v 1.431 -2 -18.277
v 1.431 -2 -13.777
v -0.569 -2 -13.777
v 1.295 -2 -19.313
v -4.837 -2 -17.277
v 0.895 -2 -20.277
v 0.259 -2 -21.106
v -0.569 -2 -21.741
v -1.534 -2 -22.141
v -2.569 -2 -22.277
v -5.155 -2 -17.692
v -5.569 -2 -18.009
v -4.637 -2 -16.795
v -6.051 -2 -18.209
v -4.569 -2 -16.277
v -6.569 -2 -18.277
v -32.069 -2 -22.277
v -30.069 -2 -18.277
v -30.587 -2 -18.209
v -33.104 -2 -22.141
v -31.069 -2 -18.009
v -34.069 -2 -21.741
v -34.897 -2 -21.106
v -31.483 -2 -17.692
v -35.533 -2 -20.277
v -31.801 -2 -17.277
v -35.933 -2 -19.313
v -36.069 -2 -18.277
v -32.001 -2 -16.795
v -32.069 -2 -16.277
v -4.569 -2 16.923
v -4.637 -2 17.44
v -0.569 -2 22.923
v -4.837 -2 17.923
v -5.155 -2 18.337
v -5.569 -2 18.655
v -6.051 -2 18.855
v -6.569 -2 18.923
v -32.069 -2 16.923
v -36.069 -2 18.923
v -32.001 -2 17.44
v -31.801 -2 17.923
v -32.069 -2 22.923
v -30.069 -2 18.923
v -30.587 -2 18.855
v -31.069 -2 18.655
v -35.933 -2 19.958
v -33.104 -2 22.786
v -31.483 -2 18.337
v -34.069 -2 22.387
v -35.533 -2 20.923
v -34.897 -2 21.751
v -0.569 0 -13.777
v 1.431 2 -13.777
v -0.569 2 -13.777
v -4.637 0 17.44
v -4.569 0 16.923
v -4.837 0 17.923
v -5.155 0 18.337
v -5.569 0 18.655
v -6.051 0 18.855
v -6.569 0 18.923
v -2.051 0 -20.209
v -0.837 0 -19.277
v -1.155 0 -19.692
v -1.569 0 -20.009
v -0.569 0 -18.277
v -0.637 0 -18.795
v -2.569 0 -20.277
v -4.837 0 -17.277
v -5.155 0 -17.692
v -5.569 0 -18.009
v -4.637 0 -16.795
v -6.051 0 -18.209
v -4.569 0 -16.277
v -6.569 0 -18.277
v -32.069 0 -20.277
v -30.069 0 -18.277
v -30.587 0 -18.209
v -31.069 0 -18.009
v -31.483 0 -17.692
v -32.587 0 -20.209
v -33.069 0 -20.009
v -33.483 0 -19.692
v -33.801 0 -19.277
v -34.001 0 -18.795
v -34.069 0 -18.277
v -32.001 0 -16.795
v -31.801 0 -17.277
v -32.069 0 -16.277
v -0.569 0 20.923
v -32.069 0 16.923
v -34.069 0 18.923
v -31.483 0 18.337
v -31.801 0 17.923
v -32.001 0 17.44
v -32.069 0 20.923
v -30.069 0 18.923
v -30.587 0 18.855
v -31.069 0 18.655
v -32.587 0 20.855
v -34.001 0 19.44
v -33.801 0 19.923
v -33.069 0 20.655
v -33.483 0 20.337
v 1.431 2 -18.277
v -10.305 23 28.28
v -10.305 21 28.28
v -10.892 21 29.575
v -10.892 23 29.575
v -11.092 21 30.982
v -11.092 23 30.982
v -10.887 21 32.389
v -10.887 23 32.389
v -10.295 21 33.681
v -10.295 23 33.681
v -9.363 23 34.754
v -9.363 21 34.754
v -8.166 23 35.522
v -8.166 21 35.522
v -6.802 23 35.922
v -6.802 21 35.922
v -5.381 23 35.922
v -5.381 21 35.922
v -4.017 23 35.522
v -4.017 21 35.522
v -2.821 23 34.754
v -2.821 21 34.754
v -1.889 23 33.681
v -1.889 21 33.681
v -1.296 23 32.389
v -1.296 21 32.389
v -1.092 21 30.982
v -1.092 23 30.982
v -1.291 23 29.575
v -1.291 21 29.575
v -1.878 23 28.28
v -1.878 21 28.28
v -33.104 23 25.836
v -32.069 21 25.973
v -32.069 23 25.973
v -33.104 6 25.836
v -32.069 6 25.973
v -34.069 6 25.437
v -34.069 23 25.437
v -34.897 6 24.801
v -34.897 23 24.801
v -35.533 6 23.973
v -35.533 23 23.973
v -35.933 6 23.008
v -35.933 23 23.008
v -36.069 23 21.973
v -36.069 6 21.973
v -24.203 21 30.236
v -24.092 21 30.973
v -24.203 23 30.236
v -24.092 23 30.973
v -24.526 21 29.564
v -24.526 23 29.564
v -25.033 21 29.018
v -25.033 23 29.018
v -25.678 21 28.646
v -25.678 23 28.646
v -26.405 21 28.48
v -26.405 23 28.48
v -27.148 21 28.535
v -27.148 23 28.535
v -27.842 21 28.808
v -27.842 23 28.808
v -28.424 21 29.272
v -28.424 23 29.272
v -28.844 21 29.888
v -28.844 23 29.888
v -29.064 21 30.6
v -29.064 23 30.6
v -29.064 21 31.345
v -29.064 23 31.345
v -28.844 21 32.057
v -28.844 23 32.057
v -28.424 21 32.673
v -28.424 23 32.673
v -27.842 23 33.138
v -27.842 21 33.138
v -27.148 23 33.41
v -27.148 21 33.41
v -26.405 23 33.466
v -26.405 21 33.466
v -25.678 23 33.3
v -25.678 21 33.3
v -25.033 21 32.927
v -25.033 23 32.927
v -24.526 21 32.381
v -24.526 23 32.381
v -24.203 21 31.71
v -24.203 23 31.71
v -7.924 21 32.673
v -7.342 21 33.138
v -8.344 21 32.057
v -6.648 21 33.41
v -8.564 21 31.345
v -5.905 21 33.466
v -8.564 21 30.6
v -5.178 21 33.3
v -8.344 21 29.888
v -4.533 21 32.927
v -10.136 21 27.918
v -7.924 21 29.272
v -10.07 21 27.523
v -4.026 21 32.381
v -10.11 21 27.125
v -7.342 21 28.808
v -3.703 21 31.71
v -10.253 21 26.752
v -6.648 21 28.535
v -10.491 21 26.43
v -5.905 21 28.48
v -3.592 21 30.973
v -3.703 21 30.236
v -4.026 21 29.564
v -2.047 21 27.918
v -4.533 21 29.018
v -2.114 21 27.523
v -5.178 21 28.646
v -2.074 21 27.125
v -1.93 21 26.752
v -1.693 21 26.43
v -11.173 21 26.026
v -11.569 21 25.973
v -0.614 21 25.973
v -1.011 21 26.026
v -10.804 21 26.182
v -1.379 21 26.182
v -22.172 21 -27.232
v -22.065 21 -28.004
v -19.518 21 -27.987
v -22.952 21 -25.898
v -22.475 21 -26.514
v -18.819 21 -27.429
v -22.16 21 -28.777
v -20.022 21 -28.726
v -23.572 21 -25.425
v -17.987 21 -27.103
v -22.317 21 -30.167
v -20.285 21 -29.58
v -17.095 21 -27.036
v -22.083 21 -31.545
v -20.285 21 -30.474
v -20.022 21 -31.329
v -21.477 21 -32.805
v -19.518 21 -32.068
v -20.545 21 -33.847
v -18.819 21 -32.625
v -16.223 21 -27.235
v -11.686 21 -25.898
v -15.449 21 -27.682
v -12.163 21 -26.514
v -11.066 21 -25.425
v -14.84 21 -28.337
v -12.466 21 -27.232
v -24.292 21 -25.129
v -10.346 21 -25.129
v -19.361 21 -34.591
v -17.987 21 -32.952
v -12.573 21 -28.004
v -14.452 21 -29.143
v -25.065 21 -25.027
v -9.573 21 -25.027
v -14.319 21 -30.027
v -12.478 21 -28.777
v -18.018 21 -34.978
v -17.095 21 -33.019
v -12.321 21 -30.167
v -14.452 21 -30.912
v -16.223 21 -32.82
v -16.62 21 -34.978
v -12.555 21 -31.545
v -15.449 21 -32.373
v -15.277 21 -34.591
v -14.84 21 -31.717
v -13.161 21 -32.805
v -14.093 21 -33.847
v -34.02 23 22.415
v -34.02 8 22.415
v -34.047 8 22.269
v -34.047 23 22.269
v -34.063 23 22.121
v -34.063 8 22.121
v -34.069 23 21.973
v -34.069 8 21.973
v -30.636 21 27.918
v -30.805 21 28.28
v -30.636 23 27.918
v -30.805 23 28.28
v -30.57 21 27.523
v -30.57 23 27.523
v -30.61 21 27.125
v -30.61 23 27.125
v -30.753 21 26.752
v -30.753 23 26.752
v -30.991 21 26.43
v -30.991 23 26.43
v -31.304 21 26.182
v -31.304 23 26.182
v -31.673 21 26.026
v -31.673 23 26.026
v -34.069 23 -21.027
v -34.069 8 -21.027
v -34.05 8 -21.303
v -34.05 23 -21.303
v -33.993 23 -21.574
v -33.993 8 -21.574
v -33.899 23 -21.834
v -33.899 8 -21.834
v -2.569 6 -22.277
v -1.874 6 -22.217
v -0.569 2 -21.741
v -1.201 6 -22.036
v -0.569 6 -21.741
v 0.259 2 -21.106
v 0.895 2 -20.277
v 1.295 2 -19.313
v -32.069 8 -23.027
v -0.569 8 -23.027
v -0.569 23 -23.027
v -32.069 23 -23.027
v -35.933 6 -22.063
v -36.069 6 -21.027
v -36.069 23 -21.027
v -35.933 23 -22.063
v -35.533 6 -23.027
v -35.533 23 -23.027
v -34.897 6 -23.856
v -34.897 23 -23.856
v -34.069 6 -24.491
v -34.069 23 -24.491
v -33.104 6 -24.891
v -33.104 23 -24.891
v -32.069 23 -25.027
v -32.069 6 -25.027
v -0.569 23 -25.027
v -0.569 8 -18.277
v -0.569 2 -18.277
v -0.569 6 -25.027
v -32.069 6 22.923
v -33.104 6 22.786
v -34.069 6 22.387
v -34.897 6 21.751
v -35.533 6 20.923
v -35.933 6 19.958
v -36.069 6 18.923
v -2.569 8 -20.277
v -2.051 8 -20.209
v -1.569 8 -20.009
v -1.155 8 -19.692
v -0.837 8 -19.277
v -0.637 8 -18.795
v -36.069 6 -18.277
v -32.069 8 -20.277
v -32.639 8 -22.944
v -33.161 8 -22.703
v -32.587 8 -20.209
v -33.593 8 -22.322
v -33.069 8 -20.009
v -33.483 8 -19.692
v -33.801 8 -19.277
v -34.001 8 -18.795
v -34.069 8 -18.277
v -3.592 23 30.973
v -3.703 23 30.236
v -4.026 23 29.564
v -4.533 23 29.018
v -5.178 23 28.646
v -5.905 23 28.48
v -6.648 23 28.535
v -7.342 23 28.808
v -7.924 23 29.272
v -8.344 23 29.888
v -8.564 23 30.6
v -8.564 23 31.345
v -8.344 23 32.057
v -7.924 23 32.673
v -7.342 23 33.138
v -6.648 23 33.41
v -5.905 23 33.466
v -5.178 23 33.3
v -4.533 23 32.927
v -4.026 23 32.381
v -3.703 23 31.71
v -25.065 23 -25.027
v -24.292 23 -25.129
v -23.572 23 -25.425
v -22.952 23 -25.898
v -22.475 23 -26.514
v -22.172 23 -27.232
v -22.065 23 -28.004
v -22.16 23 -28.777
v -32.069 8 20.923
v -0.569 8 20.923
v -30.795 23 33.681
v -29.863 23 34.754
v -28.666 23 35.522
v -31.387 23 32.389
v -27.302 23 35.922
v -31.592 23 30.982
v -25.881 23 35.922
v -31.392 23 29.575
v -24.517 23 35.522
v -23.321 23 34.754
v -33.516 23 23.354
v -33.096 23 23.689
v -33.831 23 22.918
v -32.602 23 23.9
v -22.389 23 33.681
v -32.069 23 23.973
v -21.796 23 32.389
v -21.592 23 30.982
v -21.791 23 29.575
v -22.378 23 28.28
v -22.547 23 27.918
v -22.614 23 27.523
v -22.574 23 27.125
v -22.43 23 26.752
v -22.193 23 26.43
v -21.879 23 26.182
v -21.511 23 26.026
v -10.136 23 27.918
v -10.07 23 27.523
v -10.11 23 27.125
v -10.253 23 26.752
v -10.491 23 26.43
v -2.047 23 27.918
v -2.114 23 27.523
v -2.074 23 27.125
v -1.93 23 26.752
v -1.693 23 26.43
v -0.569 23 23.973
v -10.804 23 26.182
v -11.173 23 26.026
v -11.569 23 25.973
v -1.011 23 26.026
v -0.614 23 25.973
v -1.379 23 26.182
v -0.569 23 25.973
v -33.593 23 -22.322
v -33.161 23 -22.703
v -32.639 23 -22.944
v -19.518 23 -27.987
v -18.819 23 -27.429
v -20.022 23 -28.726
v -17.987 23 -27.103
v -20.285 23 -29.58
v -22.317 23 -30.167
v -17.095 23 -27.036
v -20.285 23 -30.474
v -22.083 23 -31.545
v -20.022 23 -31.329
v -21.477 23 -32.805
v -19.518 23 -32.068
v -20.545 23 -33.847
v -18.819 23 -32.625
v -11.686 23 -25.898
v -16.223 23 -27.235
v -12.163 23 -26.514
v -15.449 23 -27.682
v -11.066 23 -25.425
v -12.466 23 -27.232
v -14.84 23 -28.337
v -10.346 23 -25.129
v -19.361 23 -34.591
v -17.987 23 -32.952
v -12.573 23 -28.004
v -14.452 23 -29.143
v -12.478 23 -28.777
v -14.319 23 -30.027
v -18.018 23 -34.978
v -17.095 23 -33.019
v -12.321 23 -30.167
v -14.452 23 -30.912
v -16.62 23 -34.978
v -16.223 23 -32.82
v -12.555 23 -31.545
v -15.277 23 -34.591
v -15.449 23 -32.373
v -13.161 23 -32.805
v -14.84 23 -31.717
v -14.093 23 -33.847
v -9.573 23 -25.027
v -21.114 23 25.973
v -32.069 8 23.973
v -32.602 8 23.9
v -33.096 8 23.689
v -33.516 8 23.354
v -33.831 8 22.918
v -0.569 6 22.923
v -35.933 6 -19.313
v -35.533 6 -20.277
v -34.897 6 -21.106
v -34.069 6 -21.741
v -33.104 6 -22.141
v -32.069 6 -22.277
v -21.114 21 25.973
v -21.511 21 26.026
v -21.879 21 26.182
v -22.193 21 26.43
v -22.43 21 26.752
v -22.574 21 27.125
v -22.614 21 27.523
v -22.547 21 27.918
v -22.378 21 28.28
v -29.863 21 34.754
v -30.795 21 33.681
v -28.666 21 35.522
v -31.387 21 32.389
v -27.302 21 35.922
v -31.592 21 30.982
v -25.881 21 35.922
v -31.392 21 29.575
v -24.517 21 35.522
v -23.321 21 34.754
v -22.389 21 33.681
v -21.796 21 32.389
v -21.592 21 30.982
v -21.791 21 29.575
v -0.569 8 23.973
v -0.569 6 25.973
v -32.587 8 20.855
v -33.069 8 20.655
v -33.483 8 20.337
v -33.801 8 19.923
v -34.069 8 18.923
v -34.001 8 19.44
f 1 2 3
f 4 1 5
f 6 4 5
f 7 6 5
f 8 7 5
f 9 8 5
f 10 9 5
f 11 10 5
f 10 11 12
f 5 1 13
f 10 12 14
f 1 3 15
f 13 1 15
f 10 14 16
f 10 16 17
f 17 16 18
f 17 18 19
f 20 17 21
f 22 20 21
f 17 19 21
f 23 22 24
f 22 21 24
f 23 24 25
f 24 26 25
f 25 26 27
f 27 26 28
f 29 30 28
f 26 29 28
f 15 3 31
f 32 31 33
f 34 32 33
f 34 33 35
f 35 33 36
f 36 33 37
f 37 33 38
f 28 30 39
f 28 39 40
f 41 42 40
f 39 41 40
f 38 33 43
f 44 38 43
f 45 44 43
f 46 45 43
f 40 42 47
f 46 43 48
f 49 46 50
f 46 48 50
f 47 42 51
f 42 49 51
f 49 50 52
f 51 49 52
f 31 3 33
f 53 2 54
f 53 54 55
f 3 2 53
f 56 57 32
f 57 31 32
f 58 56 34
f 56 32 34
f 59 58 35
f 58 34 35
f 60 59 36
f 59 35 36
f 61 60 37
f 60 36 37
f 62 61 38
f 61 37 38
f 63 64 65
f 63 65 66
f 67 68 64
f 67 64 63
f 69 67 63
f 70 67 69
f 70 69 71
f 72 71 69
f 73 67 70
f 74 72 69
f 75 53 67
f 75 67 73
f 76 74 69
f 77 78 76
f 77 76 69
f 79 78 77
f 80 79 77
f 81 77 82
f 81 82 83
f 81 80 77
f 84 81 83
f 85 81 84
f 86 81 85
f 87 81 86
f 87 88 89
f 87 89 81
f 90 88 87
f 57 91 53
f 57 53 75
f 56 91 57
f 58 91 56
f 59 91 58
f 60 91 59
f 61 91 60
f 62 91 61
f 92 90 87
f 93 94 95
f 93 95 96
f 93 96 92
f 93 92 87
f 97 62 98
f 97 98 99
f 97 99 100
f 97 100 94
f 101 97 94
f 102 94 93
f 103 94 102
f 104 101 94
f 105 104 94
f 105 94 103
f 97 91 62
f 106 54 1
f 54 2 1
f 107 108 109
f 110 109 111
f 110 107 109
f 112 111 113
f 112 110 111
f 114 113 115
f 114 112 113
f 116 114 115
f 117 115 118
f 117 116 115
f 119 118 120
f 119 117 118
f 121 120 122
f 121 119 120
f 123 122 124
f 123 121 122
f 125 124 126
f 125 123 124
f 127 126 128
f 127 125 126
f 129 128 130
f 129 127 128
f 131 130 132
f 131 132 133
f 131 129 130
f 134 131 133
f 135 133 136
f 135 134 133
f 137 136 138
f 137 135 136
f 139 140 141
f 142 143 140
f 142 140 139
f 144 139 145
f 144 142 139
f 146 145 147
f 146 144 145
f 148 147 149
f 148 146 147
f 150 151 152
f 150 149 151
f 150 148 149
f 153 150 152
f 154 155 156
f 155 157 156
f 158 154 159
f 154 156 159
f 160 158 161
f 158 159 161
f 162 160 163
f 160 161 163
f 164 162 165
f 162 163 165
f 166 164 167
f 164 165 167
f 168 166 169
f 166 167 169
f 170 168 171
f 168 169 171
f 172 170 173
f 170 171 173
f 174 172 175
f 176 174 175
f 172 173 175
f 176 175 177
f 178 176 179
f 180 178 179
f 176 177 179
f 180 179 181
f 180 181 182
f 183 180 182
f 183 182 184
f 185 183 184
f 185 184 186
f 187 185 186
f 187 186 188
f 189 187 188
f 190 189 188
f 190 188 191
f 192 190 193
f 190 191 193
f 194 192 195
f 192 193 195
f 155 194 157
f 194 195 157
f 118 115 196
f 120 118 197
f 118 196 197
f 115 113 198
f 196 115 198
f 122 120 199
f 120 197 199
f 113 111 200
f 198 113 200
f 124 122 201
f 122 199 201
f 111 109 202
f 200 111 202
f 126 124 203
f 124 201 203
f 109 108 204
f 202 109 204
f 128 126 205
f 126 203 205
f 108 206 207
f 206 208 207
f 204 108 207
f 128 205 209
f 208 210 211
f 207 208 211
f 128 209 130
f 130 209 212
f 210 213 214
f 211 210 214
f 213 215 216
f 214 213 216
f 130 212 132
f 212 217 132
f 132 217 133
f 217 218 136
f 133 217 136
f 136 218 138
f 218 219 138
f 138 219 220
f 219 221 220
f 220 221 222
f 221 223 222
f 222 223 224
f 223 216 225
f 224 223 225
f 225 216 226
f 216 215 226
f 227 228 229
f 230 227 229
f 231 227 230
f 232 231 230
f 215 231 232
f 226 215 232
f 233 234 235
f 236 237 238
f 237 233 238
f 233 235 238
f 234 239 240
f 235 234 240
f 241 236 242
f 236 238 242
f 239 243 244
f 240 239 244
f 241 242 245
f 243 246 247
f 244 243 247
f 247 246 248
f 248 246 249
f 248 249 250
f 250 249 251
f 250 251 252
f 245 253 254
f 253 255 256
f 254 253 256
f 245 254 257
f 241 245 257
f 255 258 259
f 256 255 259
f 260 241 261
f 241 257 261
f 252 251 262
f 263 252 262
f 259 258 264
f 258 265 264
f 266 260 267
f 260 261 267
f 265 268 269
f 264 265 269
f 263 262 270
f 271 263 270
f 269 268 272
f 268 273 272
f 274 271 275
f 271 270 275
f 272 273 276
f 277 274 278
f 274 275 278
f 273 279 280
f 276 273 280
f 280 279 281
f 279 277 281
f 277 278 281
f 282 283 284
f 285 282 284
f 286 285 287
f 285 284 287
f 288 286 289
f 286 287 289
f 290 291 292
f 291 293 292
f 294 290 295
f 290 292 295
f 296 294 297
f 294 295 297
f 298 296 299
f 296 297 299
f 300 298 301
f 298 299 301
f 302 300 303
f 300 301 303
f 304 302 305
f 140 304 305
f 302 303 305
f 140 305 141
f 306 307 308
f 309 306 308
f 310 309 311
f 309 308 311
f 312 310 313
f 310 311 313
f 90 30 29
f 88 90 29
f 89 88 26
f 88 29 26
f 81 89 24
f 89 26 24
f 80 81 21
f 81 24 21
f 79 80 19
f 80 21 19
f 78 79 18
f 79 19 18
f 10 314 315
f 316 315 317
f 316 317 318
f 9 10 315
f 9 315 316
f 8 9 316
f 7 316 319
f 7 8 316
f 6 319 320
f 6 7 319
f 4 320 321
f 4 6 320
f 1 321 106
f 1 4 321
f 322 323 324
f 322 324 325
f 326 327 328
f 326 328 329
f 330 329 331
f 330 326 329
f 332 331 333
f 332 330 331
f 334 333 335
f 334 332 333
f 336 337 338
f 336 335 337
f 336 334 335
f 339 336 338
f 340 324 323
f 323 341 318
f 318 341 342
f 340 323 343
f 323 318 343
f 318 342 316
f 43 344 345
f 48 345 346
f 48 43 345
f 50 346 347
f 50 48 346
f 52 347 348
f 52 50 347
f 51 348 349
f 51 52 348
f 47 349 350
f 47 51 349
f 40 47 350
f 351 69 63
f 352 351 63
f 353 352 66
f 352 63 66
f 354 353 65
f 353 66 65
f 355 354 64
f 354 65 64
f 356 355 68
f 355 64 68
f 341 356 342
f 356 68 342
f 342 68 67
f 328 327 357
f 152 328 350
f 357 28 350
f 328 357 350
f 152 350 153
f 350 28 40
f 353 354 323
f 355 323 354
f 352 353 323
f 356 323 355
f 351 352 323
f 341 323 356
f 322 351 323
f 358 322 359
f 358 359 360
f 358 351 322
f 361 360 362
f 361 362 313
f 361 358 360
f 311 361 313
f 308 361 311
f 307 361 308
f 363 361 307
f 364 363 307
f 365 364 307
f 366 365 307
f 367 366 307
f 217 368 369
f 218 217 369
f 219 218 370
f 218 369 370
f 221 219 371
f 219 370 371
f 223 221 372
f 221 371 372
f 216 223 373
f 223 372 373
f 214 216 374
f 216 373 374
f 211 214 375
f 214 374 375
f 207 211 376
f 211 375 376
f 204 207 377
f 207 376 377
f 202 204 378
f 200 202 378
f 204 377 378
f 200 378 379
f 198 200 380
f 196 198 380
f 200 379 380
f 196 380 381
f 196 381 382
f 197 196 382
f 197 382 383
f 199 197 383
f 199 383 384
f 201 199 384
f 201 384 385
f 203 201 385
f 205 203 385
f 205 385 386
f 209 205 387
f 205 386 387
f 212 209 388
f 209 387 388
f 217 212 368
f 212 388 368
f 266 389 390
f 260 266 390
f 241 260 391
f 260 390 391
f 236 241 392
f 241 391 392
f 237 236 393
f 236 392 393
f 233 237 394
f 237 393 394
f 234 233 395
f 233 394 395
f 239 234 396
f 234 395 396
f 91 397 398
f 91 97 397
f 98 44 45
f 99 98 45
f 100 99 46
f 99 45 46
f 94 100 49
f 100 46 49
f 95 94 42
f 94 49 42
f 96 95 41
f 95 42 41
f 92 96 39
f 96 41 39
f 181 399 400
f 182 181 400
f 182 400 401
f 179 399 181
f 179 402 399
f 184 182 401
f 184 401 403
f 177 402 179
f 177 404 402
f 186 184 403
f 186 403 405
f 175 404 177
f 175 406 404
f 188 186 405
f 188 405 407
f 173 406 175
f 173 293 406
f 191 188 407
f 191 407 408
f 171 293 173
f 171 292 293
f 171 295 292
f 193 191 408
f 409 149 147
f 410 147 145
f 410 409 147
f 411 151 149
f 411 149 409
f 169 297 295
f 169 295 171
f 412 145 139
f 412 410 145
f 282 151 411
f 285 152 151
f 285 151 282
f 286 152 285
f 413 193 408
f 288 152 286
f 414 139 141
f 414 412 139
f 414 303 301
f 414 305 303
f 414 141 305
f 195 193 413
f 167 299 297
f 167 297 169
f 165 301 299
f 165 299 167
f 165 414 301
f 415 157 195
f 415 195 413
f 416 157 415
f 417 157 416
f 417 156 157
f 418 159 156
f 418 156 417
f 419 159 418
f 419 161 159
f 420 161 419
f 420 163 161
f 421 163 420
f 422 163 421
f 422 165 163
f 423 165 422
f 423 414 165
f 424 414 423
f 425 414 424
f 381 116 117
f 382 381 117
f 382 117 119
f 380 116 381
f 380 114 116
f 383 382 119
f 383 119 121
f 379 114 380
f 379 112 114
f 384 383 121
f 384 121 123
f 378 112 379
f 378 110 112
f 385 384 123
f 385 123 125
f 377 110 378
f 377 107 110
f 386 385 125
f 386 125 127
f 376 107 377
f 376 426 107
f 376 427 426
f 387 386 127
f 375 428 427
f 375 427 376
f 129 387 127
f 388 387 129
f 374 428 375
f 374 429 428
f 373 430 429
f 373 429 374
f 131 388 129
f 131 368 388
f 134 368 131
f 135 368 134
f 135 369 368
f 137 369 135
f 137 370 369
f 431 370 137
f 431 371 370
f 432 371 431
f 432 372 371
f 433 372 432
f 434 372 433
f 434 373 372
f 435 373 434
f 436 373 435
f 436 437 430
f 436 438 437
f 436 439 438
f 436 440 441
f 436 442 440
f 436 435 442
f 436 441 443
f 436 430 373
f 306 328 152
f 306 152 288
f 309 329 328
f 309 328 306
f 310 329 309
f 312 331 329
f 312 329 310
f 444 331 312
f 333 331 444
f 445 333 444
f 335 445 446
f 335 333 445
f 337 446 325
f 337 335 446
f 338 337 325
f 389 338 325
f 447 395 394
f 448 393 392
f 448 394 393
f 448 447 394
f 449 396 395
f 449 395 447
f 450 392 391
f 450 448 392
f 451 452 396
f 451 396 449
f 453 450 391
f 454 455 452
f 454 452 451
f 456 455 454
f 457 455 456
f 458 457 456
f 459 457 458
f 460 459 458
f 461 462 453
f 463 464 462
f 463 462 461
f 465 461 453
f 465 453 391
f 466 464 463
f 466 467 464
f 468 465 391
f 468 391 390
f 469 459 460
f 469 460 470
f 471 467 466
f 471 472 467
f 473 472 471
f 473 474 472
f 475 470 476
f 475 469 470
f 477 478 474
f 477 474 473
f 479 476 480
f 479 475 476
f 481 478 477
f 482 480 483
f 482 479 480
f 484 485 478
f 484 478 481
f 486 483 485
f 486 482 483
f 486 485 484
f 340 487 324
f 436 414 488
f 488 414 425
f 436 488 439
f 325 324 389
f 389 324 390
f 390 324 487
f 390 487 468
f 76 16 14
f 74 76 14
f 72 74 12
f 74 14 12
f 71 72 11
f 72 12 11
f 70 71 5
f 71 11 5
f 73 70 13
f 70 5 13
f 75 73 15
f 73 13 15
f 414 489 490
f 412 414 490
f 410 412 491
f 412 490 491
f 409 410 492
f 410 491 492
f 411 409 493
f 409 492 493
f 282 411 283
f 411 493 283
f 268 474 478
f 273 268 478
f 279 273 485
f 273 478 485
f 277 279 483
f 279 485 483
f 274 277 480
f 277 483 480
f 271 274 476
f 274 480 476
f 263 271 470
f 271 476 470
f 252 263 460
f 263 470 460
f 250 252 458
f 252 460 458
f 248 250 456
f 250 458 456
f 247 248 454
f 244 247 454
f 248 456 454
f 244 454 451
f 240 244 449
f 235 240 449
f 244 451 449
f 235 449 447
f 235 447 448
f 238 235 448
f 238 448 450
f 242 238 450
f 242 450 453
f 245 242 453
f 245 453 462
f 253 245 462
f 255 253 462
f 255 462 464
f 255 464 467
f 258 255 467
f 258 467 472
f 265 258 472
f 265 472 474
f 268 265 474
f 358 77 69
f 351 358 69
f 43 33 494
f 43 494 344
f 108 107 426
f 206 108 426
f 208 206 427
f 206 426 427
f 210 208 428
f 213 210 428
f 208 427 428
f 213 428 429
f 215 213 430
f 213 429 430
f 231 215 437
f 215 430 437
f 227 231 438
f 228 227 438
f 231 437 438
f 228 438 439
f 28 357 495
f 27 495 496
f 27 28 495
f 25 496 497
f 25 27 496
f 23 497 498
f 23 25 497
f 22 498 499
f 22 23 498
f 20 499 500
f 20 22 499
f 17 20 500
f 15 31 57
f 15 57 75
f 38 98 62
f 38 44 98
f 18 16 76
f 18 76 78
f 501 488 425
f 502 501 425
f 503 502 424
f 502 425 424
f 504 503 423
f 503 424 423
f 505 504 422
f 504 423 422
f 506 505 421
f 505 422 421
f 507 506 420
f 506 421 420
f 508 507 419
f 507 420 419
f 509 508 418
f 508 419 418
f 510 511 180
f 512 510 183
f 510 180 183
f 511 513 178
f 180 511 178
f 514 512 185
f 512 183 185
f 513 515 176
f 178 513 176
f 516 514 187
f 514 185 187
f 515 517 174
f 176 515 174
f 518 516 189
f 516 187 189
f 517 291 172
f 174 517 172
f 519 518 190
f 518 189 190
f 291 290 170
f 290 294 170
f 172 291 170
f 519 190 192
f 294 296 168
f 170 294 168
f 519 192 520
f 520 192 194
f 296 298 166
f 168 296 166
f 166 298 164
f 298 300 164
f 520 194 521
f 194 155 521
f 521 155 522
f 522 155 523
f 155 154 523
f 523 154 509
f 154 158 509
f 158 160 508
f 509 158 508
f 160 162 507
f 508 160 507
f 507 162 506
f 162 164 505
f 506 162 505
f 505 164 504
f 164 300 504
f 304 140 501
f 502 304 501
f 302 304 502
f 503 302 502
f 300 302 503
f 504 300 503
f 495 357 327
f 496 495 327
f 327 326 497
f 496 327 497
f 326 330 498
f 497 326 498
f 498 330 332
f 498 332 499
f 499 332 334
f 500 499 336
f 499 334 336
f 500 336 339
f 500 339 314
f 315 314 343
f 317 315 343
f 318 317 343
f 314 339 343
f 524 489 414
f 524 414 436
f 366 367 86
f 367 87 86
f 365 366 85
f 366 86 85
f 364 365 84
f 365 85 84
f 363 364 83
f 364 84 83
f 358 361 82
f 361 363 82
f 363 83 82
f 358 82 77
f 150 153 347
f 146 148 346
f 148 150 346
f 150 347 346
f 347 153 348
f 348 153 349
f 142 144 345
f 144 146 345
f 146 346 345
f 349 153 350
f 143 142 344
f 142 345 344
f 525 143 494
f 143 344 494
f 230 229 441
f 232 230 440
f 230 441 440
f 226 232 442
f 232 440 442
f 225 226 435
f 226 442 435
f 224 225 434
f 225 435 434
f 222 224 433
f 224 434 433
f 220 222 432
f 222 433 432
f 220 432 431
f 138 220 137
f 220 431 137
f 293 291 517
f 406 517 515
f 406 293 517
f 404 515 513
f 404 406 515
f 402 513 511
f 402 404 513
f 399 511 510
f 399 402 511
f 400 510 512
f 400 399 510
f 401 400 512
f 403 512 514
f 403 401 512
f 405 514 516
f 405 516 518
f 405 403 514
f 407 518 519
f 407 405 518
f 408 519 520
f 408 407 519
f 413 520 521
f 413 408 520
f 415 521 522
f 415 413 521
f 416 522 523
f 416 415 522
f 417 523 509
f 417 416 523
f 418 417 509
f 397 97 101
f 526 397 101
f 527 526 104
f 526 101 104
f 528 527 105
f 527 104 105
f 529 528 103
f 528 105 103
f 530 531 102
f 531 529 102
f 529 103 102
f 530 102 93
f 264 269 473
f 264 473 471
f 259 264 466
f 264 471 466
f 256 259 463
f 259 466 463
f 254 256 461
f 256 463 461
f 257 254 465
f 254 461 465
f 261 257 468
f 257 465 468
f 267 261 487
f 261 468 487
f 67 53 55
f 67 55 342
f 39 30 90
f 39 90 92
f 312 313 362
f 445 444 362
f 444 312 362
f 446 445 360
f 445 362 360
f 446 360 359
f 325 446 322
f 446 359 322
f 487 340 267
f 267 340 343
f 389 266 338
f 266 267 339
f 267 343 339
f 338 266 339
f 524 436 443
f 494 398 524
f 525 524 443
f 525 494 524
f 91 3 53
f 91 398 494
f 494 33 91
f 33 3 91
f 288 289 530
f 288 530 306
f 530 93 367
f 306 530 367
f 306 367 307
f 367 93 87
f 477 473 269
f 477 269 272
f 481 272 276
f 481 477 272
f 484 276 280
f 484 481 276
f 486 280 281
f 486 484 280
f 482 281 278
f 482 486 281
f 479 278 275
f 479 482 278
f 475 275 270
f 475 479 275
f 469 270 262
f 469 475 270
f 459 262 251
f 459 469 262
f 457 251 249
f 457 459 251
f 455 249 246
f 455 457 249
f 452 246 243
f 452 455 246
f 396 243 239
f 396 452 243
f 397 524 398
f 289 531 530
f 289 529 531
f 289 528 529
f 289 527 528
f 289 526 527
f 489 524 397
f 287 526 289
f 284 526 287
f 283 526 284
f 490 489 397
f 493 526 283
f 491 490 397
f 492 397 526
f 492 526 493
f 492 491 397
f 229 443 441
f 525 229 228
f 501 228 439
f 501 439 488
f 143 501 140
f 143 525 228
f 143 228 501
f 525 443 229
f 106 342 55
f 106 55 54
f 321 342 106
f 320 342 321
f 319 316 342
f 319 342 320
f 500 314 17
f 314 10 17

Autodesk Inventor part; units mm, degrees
ref_plane "YZ Plane" through (0, 0, 0) normal (1, 0, 0) x (0, 1, 0)
ref_plane "XZ Plane" through (0, 0, 0) normal (0, 1, 0) x (-1, 0, 0)
sketch "Sketch1" plane through (0, 0, 0) normal (0, 1, 0) x (-1, 0, 0)
  arc A0 (31.569, 13.7227) -> (30.069, 12.2227) centre (31.569, 12.2227) ccw
  line L0 (31.569, 13.7227) -> (34.069, 13.7227)
  line L1 (34.069, 13.7227) -> (34.069, 18.9227)
  line L2 (32.069, 20.9227) -> (0.569, 20.9227)
  line L3 (-1.431, -13.7773) -> (0.569, -13.7773)
  line L4 (0.569, -13.7773) -> (0.569, -18.2773)
  line L5 (34.069, -13.2773) -> (31.569, -13.2773)
  arc A1 (30.069, -11.7773) -> (31.569, -13.2773) centre (31.569, -11.7773) ccw
  arc A2 (34.069, 18.9227) -> (32.069, 20.9227) centre (32.069, 18.9227) ccw
  arc A3 (34.0195, 22.4149) -> (32.069, 23.9727) centre (32.069, 21.9727) ccw
  line L6 (32.069, 23.9727) -> (-23.931, 23.9727)
  arc A4 (-23.931, 23.9727) -> (-25.931, 21.9727) centre (-23.931, 21.9727) ccw
  line L7 (-25.931, 21.9727) -> (-25.931, -21.0273)
  arc A5 (-25.931, -21.0273) -> (-23.931, -23.0273) centre (-23.931, -21.0273) ccw
  line L8 (-23.931, -23.0273) -> (32.069, -23.0273)
  arc A6 (32.069, -23.0273) -> (33.899, -21.8341) centre (32.069, -21.0273) ccw
  arc A7 (32.069, -20.2773) -> (34.069, -18.2773) centre (32.069, -18.2773) ccw
  line L9 (32.069, -20.2773) -> (2.569, -20.2773)
  arc A8 (0.569, -18.2773) -> (2.569, -20.2773) centre (2.569, -18.2773) ccw
  line L10 (34.069, -13.2773) -> (34.069, 13.7227)
  line L11 (0.569, -13.7773) -> (0.569, 20.9227)
  line L12 (30.069, -11.7773) -> (30.069, 12.2227)
  line L13 (0.569, 22.9227) -> (0.569, 20.9227)
  line L14 (34.069, -18.2773) -> (34.069, -13.2773)
  line L15 (0.569, 22.9227) -> (32.069, 22.9227)
  arc A9 (36.069, 18.9227) -> (32.069, 22.9227) centre (32.069, 18.9227) ccw
  line L16 (-1.431, -13.7773) -> (-1.431, -18.2773)
  arc A10 (-1.431, -18.2773) -> (2.569, -22.2773) centre (2.569, -18.2773) ccw
  line L17 (2.569, -22.2773) -> (32.069, -22.2773)
  arc A11 (32.069, -22.2773) -> (36.069, -18.2773) centre (32.069, -18.2773) ccw
  line L18 (36.069, -18.2773) -> (36.069, 18.9227)
  dimension "d8" = 2
  dimension "d9" = 2
extrude "Extrusion3" add sketch "Sketch1" against normal blind 2 contours L0 L10 L5 A1 L12 A0 | A0 L12 A1 L5 L14 A7 L9 A8 L4 L11 L2 A2 L1 L0 | L1 A2 L2 L13 L15 A9 L18 A11 L17 A10 L16 L3 L4 A8 L9 A7 L14 L10
ref_plane "Work Plane1" through (0, 8, 0) normal (0, 1, 0) x (1, 0, 0)
extrude "Extrusion4" add sketch "Sketch1" along normal blind 8 contours L1 A2 L2 L13 L15 A9 L18 A11 L17 A10 L16 L3 L4 A8 L9 A7 L14 L10
sketch "Sketch2" plane through (0, 8, 0) normal (0, 1, 0) x (1, 0, 0)
  line L0 (23.931, 23.0273) -> (-32.069, 23.0273) projected
  arc A0 (-32.069, 23.0273) -> (-33.899, 21.8341) centre (-32.069, 21.0273) ccw projected
  line L1 (-32.069, -23.9727) -> (23.931, -23.9727) projected
  arc A1 (-34.0195, -22.4149) -> (-32.069, -23.9727) centre (-32.069, -21.9727) ccw projected
  line L2 (-36.069, 18.2773) -> (-36.069, -18.9227) projected
  arc A2 (-32.069, 23.0273) -> (-34.069, 21.0273) centre (-32.069, 21.0273) ccw
  arc A3 (-34.069, -21.9727) -> (-32.069, -23.9727) centre (-32.069, -21.9727) ccw
  line L3 (-34.069, 18.2773) -> (-34.069, 13.2773) projected
  line L4 (-34.069, 13.2773) -> (-34.069, -13.7227) projected
  line L5 (-34.069, -13.7227) -> (-34.069, -18.9227) projected
  line L6 (-34.069, -21.9727) -> (-34.069, 21.0273)
  arc A4 (-32.069, 25.0273) -> (-36.069, 21.0273) centre (-32.069, 21.0273) ccw
  line L7 (-36.069, 21.0273) -> (-36.069, -21.9727)
  arc A5 (-36.069, -21.9727) -> (-32.069, -25.9727) centre (-32.069, -21.9727) ccw
  line L8 (-0.569, 25.0273) -> (-32.069, 25.0273)
  arc A6 (-32.069, 25.0273) -> (-35.729, 22.6409) centre (-32.069, 21.0273) ccw
  line L9 (-0.569, -25.9727) -> (-32.069, -25.9727)
  arc A7 (-35.97, -22.8571) -> (-32.069, -25.9727) centre (-32.069, -21.9727) ccw
  line L10 (-0.569, 13.7773) -> (-0.569, -22.9227) projected
  line L11 (-0.569, -23.9727) -> (-0.569, -25.9727)
  line L12 (-0.569, 18.2773) -> (-0.569, 25.0273)
  line L13 (-0.569, 13.7773) -> (-0.569, 18.2773) projected
  line L14 (-32.069, 23.0273) -> (-0.569, 23.0273)
  line L15 (-32.069, -23.9727) -> (-0.569, -23.9727)
  arc A8 (-0.569, 18.2773) -> (-2.569, 20.2773) centre (-2.569, 18.2773) ccw projected
  line L16 (-32.069, -20.9227) -> (-0.569, -20.9227) projected
  line L17 (-0.569, -20.9227) -> (-0.569, 13.7773) projected
  line L18 (-0.569, 13.7773) -> (-0.569, 18.2773) projected
  arc A9 (-0.569, 18.2773) -> (-2.569, 20.2773) centre (-2.569, 18.2773) ccw projected
  line L19 (-2.569, 20.2773) -> (-32.069, 20.2773) projected
  arc A10 (-32.069, 20.2773) -> (-34.069, 18.2773) centre (-32.069, 18.2773) ccw projected
  line L20 (-34.069, 18.2773) -> (-34.069, -18.9227) projected
  arc A11 (-34.069, -18.9227) -> (-32.069, -20.9227) centre (-32.069, -18.9227) ccw projected
  line L21 (-0.569, -23.9727) -> (-0.569, -22.9227)
  line L22 (-32.069, 22.2773) -> (-2.569, 22.2773) projected
  line L23 (-2.569, 22.2773) -> (-0.569, 22.2773)
  arc A12 (1.431, 18.2773) -> (-2.569, 22.2773) centre (-2.569, 18.2773) ccw projected
  point P0 (0, 0)
  point P1 (-0.569, 21.7414)
  dimension "d18" = 2
  dimension "d19" = 2
  dimension "d20" = 2
  dimension "d21" = 31.5
  dimension "d22" = 31.5
  dimension "d23" = 31.5
sketch "Sketch3" plane through (0, 8, 0) normal (0, 1, 0) x (1, 0, 0)
  line L0 (-0.569, 18.2773) -> (-0.569, 13.7773) projected
  line L1 (-0.569, 13.7773) -> (1.431, 13.7773) projected
  line L2 (1.431, 13.7773) -> (1.431, 18.2773) projected
  arc A0 (1.431, 18.2773) -> (-2.569, 22.2773) centre (-2.569, 18.2773) ccw projected
  line L3 (-0.569, -20.9227) -> (-32.069, -20.9227) projected
  arc A1 (-34.069, -18.9227) -> (-32.069, -20.9227) centre (-32.069, -18.9227) ccw projected
  line L4 (-34.069, -18.9227) -> (-34.069, 18.2773) projected
  arc A2 (-32.069, 20.2773) -> (-34.069, 18.2773) centre (-32.069, 18.2773) ccw projected
  line L5 (-32.069, 20.2773) -> (-2.569, 20.2773) projected
  arc A3 (-0.569, 18.2773) -> (-2.569, 20.2773) centre (-2.569, 18.2773) ccw projected
  arc A4 (-32.069, 22.2773) -> (-36.069, 18.2773) centre (-32.069, 18.2773) ccw projected
  line L6 (-36.069, 18.2773) -> (-36.069, -18.9227) projected
  arc A5 (-36.069, -18.9227) -> (-32.069, -22.9227) centre (-32.069, -18.9227) ccw projected
  line L7 (-32.069, -22.9227) -> (-0.569, -22.9227) projected
  line L8 (-0.569, -22.9227) -> (-0.569, -20.9227) projected
  line L9 (-2.569, 22.2773) -> (-32.069, 22.2773) projected
  point P0 (0, 0)
extrude "Extrusion7" add sketch "Sketch2" against normal blind 2 contours L12 L23 A12 A8 L19 A10 L6 A2 A0 L0 | L0 A0 A2 L6 L3 L4 L5 A3 A1 L1 L11 L9 A5 L7 L2 A4 L8 L12 | L12 A12 L23 | L10 L21 L1 A1 A3 L6 A11 L16
extrude "Extrusion8" add sketch "Sketch2" along normal blind 15 contours L0 A0 A2 L6 L3 L4 L5 A3 A1 L1 L11 L9 A5 L7 L2 A4 L8 L12
sketch "Sketch4" plane through (0, 8, 0) normal (0, 1, 0) x (1, 0, 0)
  line L0 (1.431, 13.7773) -> (1.431, 18.2773) projected
  line L1 (-0.569, 13.7773) -> (1.431, 13.7773) projected
  line L2 (-0.569, 18.2773) -> (-0.569, 25.0273) projected
  line L3 (-0.569, 18.2773) -> (-0.569, 13.7773) projected
  arc A0 (1.431, 18.2773) -> (-0.569, 21.7414) centre (-2.569, 18.2773) ccw projected
  point P0 (0, 0)
extrude "Extrusion9" cut sketch "Sketch4" against normal blind 6
sketch "Sketch5" plane through (0, 23, 0) normal (0, 1, 0) x (1, 0, 0)
  circle A0 centre (-17.319, 30.0273) radius 5
  circle A1 centre (-17.319, 30.0273) radius 3
  line L0 (-0.569, 25.0273) -> (-32.069, 25.0273) projected
  arc A2 (-12.4777, 28.7773) -> (-9.573, 25.0273) centre (-9.573, 28.0273) ccw
  arc A3 (-25.0649, 25.0273) -> (-22.1602, 28.7773) centre (-25.0649, 28.0273) ccw
  line L1 (-0.569, 23.0273) -> (-0.569, 25.0273) projected
  line L2 (-34.069, -21.9727) -> (-34.069, 21.0273) projected
  circle A4 centre (-6.0917, -30.9727) radius 5
  circle A5 centre (-6.0917, -30.9727) radius 2.5
  arc A6 (-10.305, -28.2804) -> (-11.569, -25.9727) centre (-11.569, -27.4727) ccw
  arc A7 (-0.6145, -25.9727) -> (-1.8785, -28.2804) centre (-0.6145, -27.4727) ccw
  line L3 (-32.069, -25.9727) -> (-0.569, -25.9727) projected
  circle A8 centre (-26.5917, -30.9727) radius 5
  circle A9 centre (-26.5917, -30.9727) radius 2.5
  arc A10 (-30.805, -28.2804) -> (-32.069, -25.9727) centre (-32.069, -27.4727) ccw
  arc A11 (-21.1145, -25.9727) -> (-22.3785, -28.2804) centre (-21.1145, -27.4727) ccw
  line L4 (-0.569, -25.9727) -> (-0.569, -23.9727) projected
  arc A12 (-36.069, -21.9727) -> (-32.069, -25.9727) centre (-32.069, -21.9727) ccw projected
  point P0 (0, 0)
  point P1 (1.0185, -24.3852)
  dimension "d34" = 10
  dimension "d35" = 6
  dimension "d36" = 33.5
  dimension "d37" = 16.75
  dimension "d38" = 3
  dimension "d39" = 3
  dimension "d40" = 10
  dimension "d41" = 5
  dimension "d42" = 3
  dimension "d43" = 3
  dimension "d44" = 10
  dimension "d45" = 5
  dimension "d46" = 3
  dimension "d47" = 3
  dimension "d49" = 20.5
extrude "Extrusion10" add sketch "Sketch5" against normal blind 2
sketch "Sketch6" plane through (0, -2, 0) normal (0, -1, 0) x (1, 0, 0)
  line L0 (1.431, -18.2773) -> (1.431, -13.7773) projected
  line L1 (1.431, -13.7773) -> (-0.569, -13.7773) projected
  line L2 (-0.569, -13.7773) -> (-0.569, 22.9227) projected
  line L3 (-0.569, 22.9227) -> (-32.069, 22.9227) projected
  arc A0 (-32.069, 22.9227) -> (-36.069, 18.9227) centre (-32.069, 18.9227) ccw projected
  line L4 (-36.069, 18.9227) -> (-36.069, -18.2773) projected
  arc A1 (-36.069, -18.2773) -> (-32.069, -22.2773) centre (-32.069, -18.2773) ccw projected
  line L5 (-32.069, -22.2773) -> (-2.569, -22.2773) projected
  arc A2 (-2.569, -22.2773) -> (1.431, -18.2773) centre (-2.569, -18.2773) ccw projected
  line L6 (-30.069, 18.9227) -> (-6.569, 18.9227)
  line L7 (-4.569, 16.9227) -> (-4.569, -16.2773)
  line L8 (-6.569, -18.2773) -> (-30.069, -18.2773)
  line L9 (-32.069, -16.2773) -> (-32.069, 16.9227)
  arc A3 (-6.569, -18.2773) -> (-4.569, -16.2773) centre (-6.569, -16.2773) ccw
  arc A4 (-32.069, -16.2773) -> (-30.069, -18.2773) centre (-30.069, -16.2773) ccw
  arc A5 (-30.069, 18.9227) -> (-32.069, 16.9227) centre (-30.069, 16.9227) ccw
  arc A6 (-4.569, 16.9227) -> (-6.569, 18.9227) centre (-6.569, 16.9227) ccw
  point P0 (0, 0)
  point P1 (-4.569, 18.9227)
  point P2 (-4.569, -18.2773)
  dimension "d52" = 4
  dimension "d53" = 37.2
  dimension "d54" = 27.5
  dimension "d55" = 4
  dimension "d56" = 2
extrude "Extrusion11" cut sketch "Sketch6" against normal blind 2 contours L6 A6 L7 A3 L8 A4 L9 A5
equation "\"d37\" = 0.5 * d36"
properties part number "CO-1-01-motorControllersMount"
